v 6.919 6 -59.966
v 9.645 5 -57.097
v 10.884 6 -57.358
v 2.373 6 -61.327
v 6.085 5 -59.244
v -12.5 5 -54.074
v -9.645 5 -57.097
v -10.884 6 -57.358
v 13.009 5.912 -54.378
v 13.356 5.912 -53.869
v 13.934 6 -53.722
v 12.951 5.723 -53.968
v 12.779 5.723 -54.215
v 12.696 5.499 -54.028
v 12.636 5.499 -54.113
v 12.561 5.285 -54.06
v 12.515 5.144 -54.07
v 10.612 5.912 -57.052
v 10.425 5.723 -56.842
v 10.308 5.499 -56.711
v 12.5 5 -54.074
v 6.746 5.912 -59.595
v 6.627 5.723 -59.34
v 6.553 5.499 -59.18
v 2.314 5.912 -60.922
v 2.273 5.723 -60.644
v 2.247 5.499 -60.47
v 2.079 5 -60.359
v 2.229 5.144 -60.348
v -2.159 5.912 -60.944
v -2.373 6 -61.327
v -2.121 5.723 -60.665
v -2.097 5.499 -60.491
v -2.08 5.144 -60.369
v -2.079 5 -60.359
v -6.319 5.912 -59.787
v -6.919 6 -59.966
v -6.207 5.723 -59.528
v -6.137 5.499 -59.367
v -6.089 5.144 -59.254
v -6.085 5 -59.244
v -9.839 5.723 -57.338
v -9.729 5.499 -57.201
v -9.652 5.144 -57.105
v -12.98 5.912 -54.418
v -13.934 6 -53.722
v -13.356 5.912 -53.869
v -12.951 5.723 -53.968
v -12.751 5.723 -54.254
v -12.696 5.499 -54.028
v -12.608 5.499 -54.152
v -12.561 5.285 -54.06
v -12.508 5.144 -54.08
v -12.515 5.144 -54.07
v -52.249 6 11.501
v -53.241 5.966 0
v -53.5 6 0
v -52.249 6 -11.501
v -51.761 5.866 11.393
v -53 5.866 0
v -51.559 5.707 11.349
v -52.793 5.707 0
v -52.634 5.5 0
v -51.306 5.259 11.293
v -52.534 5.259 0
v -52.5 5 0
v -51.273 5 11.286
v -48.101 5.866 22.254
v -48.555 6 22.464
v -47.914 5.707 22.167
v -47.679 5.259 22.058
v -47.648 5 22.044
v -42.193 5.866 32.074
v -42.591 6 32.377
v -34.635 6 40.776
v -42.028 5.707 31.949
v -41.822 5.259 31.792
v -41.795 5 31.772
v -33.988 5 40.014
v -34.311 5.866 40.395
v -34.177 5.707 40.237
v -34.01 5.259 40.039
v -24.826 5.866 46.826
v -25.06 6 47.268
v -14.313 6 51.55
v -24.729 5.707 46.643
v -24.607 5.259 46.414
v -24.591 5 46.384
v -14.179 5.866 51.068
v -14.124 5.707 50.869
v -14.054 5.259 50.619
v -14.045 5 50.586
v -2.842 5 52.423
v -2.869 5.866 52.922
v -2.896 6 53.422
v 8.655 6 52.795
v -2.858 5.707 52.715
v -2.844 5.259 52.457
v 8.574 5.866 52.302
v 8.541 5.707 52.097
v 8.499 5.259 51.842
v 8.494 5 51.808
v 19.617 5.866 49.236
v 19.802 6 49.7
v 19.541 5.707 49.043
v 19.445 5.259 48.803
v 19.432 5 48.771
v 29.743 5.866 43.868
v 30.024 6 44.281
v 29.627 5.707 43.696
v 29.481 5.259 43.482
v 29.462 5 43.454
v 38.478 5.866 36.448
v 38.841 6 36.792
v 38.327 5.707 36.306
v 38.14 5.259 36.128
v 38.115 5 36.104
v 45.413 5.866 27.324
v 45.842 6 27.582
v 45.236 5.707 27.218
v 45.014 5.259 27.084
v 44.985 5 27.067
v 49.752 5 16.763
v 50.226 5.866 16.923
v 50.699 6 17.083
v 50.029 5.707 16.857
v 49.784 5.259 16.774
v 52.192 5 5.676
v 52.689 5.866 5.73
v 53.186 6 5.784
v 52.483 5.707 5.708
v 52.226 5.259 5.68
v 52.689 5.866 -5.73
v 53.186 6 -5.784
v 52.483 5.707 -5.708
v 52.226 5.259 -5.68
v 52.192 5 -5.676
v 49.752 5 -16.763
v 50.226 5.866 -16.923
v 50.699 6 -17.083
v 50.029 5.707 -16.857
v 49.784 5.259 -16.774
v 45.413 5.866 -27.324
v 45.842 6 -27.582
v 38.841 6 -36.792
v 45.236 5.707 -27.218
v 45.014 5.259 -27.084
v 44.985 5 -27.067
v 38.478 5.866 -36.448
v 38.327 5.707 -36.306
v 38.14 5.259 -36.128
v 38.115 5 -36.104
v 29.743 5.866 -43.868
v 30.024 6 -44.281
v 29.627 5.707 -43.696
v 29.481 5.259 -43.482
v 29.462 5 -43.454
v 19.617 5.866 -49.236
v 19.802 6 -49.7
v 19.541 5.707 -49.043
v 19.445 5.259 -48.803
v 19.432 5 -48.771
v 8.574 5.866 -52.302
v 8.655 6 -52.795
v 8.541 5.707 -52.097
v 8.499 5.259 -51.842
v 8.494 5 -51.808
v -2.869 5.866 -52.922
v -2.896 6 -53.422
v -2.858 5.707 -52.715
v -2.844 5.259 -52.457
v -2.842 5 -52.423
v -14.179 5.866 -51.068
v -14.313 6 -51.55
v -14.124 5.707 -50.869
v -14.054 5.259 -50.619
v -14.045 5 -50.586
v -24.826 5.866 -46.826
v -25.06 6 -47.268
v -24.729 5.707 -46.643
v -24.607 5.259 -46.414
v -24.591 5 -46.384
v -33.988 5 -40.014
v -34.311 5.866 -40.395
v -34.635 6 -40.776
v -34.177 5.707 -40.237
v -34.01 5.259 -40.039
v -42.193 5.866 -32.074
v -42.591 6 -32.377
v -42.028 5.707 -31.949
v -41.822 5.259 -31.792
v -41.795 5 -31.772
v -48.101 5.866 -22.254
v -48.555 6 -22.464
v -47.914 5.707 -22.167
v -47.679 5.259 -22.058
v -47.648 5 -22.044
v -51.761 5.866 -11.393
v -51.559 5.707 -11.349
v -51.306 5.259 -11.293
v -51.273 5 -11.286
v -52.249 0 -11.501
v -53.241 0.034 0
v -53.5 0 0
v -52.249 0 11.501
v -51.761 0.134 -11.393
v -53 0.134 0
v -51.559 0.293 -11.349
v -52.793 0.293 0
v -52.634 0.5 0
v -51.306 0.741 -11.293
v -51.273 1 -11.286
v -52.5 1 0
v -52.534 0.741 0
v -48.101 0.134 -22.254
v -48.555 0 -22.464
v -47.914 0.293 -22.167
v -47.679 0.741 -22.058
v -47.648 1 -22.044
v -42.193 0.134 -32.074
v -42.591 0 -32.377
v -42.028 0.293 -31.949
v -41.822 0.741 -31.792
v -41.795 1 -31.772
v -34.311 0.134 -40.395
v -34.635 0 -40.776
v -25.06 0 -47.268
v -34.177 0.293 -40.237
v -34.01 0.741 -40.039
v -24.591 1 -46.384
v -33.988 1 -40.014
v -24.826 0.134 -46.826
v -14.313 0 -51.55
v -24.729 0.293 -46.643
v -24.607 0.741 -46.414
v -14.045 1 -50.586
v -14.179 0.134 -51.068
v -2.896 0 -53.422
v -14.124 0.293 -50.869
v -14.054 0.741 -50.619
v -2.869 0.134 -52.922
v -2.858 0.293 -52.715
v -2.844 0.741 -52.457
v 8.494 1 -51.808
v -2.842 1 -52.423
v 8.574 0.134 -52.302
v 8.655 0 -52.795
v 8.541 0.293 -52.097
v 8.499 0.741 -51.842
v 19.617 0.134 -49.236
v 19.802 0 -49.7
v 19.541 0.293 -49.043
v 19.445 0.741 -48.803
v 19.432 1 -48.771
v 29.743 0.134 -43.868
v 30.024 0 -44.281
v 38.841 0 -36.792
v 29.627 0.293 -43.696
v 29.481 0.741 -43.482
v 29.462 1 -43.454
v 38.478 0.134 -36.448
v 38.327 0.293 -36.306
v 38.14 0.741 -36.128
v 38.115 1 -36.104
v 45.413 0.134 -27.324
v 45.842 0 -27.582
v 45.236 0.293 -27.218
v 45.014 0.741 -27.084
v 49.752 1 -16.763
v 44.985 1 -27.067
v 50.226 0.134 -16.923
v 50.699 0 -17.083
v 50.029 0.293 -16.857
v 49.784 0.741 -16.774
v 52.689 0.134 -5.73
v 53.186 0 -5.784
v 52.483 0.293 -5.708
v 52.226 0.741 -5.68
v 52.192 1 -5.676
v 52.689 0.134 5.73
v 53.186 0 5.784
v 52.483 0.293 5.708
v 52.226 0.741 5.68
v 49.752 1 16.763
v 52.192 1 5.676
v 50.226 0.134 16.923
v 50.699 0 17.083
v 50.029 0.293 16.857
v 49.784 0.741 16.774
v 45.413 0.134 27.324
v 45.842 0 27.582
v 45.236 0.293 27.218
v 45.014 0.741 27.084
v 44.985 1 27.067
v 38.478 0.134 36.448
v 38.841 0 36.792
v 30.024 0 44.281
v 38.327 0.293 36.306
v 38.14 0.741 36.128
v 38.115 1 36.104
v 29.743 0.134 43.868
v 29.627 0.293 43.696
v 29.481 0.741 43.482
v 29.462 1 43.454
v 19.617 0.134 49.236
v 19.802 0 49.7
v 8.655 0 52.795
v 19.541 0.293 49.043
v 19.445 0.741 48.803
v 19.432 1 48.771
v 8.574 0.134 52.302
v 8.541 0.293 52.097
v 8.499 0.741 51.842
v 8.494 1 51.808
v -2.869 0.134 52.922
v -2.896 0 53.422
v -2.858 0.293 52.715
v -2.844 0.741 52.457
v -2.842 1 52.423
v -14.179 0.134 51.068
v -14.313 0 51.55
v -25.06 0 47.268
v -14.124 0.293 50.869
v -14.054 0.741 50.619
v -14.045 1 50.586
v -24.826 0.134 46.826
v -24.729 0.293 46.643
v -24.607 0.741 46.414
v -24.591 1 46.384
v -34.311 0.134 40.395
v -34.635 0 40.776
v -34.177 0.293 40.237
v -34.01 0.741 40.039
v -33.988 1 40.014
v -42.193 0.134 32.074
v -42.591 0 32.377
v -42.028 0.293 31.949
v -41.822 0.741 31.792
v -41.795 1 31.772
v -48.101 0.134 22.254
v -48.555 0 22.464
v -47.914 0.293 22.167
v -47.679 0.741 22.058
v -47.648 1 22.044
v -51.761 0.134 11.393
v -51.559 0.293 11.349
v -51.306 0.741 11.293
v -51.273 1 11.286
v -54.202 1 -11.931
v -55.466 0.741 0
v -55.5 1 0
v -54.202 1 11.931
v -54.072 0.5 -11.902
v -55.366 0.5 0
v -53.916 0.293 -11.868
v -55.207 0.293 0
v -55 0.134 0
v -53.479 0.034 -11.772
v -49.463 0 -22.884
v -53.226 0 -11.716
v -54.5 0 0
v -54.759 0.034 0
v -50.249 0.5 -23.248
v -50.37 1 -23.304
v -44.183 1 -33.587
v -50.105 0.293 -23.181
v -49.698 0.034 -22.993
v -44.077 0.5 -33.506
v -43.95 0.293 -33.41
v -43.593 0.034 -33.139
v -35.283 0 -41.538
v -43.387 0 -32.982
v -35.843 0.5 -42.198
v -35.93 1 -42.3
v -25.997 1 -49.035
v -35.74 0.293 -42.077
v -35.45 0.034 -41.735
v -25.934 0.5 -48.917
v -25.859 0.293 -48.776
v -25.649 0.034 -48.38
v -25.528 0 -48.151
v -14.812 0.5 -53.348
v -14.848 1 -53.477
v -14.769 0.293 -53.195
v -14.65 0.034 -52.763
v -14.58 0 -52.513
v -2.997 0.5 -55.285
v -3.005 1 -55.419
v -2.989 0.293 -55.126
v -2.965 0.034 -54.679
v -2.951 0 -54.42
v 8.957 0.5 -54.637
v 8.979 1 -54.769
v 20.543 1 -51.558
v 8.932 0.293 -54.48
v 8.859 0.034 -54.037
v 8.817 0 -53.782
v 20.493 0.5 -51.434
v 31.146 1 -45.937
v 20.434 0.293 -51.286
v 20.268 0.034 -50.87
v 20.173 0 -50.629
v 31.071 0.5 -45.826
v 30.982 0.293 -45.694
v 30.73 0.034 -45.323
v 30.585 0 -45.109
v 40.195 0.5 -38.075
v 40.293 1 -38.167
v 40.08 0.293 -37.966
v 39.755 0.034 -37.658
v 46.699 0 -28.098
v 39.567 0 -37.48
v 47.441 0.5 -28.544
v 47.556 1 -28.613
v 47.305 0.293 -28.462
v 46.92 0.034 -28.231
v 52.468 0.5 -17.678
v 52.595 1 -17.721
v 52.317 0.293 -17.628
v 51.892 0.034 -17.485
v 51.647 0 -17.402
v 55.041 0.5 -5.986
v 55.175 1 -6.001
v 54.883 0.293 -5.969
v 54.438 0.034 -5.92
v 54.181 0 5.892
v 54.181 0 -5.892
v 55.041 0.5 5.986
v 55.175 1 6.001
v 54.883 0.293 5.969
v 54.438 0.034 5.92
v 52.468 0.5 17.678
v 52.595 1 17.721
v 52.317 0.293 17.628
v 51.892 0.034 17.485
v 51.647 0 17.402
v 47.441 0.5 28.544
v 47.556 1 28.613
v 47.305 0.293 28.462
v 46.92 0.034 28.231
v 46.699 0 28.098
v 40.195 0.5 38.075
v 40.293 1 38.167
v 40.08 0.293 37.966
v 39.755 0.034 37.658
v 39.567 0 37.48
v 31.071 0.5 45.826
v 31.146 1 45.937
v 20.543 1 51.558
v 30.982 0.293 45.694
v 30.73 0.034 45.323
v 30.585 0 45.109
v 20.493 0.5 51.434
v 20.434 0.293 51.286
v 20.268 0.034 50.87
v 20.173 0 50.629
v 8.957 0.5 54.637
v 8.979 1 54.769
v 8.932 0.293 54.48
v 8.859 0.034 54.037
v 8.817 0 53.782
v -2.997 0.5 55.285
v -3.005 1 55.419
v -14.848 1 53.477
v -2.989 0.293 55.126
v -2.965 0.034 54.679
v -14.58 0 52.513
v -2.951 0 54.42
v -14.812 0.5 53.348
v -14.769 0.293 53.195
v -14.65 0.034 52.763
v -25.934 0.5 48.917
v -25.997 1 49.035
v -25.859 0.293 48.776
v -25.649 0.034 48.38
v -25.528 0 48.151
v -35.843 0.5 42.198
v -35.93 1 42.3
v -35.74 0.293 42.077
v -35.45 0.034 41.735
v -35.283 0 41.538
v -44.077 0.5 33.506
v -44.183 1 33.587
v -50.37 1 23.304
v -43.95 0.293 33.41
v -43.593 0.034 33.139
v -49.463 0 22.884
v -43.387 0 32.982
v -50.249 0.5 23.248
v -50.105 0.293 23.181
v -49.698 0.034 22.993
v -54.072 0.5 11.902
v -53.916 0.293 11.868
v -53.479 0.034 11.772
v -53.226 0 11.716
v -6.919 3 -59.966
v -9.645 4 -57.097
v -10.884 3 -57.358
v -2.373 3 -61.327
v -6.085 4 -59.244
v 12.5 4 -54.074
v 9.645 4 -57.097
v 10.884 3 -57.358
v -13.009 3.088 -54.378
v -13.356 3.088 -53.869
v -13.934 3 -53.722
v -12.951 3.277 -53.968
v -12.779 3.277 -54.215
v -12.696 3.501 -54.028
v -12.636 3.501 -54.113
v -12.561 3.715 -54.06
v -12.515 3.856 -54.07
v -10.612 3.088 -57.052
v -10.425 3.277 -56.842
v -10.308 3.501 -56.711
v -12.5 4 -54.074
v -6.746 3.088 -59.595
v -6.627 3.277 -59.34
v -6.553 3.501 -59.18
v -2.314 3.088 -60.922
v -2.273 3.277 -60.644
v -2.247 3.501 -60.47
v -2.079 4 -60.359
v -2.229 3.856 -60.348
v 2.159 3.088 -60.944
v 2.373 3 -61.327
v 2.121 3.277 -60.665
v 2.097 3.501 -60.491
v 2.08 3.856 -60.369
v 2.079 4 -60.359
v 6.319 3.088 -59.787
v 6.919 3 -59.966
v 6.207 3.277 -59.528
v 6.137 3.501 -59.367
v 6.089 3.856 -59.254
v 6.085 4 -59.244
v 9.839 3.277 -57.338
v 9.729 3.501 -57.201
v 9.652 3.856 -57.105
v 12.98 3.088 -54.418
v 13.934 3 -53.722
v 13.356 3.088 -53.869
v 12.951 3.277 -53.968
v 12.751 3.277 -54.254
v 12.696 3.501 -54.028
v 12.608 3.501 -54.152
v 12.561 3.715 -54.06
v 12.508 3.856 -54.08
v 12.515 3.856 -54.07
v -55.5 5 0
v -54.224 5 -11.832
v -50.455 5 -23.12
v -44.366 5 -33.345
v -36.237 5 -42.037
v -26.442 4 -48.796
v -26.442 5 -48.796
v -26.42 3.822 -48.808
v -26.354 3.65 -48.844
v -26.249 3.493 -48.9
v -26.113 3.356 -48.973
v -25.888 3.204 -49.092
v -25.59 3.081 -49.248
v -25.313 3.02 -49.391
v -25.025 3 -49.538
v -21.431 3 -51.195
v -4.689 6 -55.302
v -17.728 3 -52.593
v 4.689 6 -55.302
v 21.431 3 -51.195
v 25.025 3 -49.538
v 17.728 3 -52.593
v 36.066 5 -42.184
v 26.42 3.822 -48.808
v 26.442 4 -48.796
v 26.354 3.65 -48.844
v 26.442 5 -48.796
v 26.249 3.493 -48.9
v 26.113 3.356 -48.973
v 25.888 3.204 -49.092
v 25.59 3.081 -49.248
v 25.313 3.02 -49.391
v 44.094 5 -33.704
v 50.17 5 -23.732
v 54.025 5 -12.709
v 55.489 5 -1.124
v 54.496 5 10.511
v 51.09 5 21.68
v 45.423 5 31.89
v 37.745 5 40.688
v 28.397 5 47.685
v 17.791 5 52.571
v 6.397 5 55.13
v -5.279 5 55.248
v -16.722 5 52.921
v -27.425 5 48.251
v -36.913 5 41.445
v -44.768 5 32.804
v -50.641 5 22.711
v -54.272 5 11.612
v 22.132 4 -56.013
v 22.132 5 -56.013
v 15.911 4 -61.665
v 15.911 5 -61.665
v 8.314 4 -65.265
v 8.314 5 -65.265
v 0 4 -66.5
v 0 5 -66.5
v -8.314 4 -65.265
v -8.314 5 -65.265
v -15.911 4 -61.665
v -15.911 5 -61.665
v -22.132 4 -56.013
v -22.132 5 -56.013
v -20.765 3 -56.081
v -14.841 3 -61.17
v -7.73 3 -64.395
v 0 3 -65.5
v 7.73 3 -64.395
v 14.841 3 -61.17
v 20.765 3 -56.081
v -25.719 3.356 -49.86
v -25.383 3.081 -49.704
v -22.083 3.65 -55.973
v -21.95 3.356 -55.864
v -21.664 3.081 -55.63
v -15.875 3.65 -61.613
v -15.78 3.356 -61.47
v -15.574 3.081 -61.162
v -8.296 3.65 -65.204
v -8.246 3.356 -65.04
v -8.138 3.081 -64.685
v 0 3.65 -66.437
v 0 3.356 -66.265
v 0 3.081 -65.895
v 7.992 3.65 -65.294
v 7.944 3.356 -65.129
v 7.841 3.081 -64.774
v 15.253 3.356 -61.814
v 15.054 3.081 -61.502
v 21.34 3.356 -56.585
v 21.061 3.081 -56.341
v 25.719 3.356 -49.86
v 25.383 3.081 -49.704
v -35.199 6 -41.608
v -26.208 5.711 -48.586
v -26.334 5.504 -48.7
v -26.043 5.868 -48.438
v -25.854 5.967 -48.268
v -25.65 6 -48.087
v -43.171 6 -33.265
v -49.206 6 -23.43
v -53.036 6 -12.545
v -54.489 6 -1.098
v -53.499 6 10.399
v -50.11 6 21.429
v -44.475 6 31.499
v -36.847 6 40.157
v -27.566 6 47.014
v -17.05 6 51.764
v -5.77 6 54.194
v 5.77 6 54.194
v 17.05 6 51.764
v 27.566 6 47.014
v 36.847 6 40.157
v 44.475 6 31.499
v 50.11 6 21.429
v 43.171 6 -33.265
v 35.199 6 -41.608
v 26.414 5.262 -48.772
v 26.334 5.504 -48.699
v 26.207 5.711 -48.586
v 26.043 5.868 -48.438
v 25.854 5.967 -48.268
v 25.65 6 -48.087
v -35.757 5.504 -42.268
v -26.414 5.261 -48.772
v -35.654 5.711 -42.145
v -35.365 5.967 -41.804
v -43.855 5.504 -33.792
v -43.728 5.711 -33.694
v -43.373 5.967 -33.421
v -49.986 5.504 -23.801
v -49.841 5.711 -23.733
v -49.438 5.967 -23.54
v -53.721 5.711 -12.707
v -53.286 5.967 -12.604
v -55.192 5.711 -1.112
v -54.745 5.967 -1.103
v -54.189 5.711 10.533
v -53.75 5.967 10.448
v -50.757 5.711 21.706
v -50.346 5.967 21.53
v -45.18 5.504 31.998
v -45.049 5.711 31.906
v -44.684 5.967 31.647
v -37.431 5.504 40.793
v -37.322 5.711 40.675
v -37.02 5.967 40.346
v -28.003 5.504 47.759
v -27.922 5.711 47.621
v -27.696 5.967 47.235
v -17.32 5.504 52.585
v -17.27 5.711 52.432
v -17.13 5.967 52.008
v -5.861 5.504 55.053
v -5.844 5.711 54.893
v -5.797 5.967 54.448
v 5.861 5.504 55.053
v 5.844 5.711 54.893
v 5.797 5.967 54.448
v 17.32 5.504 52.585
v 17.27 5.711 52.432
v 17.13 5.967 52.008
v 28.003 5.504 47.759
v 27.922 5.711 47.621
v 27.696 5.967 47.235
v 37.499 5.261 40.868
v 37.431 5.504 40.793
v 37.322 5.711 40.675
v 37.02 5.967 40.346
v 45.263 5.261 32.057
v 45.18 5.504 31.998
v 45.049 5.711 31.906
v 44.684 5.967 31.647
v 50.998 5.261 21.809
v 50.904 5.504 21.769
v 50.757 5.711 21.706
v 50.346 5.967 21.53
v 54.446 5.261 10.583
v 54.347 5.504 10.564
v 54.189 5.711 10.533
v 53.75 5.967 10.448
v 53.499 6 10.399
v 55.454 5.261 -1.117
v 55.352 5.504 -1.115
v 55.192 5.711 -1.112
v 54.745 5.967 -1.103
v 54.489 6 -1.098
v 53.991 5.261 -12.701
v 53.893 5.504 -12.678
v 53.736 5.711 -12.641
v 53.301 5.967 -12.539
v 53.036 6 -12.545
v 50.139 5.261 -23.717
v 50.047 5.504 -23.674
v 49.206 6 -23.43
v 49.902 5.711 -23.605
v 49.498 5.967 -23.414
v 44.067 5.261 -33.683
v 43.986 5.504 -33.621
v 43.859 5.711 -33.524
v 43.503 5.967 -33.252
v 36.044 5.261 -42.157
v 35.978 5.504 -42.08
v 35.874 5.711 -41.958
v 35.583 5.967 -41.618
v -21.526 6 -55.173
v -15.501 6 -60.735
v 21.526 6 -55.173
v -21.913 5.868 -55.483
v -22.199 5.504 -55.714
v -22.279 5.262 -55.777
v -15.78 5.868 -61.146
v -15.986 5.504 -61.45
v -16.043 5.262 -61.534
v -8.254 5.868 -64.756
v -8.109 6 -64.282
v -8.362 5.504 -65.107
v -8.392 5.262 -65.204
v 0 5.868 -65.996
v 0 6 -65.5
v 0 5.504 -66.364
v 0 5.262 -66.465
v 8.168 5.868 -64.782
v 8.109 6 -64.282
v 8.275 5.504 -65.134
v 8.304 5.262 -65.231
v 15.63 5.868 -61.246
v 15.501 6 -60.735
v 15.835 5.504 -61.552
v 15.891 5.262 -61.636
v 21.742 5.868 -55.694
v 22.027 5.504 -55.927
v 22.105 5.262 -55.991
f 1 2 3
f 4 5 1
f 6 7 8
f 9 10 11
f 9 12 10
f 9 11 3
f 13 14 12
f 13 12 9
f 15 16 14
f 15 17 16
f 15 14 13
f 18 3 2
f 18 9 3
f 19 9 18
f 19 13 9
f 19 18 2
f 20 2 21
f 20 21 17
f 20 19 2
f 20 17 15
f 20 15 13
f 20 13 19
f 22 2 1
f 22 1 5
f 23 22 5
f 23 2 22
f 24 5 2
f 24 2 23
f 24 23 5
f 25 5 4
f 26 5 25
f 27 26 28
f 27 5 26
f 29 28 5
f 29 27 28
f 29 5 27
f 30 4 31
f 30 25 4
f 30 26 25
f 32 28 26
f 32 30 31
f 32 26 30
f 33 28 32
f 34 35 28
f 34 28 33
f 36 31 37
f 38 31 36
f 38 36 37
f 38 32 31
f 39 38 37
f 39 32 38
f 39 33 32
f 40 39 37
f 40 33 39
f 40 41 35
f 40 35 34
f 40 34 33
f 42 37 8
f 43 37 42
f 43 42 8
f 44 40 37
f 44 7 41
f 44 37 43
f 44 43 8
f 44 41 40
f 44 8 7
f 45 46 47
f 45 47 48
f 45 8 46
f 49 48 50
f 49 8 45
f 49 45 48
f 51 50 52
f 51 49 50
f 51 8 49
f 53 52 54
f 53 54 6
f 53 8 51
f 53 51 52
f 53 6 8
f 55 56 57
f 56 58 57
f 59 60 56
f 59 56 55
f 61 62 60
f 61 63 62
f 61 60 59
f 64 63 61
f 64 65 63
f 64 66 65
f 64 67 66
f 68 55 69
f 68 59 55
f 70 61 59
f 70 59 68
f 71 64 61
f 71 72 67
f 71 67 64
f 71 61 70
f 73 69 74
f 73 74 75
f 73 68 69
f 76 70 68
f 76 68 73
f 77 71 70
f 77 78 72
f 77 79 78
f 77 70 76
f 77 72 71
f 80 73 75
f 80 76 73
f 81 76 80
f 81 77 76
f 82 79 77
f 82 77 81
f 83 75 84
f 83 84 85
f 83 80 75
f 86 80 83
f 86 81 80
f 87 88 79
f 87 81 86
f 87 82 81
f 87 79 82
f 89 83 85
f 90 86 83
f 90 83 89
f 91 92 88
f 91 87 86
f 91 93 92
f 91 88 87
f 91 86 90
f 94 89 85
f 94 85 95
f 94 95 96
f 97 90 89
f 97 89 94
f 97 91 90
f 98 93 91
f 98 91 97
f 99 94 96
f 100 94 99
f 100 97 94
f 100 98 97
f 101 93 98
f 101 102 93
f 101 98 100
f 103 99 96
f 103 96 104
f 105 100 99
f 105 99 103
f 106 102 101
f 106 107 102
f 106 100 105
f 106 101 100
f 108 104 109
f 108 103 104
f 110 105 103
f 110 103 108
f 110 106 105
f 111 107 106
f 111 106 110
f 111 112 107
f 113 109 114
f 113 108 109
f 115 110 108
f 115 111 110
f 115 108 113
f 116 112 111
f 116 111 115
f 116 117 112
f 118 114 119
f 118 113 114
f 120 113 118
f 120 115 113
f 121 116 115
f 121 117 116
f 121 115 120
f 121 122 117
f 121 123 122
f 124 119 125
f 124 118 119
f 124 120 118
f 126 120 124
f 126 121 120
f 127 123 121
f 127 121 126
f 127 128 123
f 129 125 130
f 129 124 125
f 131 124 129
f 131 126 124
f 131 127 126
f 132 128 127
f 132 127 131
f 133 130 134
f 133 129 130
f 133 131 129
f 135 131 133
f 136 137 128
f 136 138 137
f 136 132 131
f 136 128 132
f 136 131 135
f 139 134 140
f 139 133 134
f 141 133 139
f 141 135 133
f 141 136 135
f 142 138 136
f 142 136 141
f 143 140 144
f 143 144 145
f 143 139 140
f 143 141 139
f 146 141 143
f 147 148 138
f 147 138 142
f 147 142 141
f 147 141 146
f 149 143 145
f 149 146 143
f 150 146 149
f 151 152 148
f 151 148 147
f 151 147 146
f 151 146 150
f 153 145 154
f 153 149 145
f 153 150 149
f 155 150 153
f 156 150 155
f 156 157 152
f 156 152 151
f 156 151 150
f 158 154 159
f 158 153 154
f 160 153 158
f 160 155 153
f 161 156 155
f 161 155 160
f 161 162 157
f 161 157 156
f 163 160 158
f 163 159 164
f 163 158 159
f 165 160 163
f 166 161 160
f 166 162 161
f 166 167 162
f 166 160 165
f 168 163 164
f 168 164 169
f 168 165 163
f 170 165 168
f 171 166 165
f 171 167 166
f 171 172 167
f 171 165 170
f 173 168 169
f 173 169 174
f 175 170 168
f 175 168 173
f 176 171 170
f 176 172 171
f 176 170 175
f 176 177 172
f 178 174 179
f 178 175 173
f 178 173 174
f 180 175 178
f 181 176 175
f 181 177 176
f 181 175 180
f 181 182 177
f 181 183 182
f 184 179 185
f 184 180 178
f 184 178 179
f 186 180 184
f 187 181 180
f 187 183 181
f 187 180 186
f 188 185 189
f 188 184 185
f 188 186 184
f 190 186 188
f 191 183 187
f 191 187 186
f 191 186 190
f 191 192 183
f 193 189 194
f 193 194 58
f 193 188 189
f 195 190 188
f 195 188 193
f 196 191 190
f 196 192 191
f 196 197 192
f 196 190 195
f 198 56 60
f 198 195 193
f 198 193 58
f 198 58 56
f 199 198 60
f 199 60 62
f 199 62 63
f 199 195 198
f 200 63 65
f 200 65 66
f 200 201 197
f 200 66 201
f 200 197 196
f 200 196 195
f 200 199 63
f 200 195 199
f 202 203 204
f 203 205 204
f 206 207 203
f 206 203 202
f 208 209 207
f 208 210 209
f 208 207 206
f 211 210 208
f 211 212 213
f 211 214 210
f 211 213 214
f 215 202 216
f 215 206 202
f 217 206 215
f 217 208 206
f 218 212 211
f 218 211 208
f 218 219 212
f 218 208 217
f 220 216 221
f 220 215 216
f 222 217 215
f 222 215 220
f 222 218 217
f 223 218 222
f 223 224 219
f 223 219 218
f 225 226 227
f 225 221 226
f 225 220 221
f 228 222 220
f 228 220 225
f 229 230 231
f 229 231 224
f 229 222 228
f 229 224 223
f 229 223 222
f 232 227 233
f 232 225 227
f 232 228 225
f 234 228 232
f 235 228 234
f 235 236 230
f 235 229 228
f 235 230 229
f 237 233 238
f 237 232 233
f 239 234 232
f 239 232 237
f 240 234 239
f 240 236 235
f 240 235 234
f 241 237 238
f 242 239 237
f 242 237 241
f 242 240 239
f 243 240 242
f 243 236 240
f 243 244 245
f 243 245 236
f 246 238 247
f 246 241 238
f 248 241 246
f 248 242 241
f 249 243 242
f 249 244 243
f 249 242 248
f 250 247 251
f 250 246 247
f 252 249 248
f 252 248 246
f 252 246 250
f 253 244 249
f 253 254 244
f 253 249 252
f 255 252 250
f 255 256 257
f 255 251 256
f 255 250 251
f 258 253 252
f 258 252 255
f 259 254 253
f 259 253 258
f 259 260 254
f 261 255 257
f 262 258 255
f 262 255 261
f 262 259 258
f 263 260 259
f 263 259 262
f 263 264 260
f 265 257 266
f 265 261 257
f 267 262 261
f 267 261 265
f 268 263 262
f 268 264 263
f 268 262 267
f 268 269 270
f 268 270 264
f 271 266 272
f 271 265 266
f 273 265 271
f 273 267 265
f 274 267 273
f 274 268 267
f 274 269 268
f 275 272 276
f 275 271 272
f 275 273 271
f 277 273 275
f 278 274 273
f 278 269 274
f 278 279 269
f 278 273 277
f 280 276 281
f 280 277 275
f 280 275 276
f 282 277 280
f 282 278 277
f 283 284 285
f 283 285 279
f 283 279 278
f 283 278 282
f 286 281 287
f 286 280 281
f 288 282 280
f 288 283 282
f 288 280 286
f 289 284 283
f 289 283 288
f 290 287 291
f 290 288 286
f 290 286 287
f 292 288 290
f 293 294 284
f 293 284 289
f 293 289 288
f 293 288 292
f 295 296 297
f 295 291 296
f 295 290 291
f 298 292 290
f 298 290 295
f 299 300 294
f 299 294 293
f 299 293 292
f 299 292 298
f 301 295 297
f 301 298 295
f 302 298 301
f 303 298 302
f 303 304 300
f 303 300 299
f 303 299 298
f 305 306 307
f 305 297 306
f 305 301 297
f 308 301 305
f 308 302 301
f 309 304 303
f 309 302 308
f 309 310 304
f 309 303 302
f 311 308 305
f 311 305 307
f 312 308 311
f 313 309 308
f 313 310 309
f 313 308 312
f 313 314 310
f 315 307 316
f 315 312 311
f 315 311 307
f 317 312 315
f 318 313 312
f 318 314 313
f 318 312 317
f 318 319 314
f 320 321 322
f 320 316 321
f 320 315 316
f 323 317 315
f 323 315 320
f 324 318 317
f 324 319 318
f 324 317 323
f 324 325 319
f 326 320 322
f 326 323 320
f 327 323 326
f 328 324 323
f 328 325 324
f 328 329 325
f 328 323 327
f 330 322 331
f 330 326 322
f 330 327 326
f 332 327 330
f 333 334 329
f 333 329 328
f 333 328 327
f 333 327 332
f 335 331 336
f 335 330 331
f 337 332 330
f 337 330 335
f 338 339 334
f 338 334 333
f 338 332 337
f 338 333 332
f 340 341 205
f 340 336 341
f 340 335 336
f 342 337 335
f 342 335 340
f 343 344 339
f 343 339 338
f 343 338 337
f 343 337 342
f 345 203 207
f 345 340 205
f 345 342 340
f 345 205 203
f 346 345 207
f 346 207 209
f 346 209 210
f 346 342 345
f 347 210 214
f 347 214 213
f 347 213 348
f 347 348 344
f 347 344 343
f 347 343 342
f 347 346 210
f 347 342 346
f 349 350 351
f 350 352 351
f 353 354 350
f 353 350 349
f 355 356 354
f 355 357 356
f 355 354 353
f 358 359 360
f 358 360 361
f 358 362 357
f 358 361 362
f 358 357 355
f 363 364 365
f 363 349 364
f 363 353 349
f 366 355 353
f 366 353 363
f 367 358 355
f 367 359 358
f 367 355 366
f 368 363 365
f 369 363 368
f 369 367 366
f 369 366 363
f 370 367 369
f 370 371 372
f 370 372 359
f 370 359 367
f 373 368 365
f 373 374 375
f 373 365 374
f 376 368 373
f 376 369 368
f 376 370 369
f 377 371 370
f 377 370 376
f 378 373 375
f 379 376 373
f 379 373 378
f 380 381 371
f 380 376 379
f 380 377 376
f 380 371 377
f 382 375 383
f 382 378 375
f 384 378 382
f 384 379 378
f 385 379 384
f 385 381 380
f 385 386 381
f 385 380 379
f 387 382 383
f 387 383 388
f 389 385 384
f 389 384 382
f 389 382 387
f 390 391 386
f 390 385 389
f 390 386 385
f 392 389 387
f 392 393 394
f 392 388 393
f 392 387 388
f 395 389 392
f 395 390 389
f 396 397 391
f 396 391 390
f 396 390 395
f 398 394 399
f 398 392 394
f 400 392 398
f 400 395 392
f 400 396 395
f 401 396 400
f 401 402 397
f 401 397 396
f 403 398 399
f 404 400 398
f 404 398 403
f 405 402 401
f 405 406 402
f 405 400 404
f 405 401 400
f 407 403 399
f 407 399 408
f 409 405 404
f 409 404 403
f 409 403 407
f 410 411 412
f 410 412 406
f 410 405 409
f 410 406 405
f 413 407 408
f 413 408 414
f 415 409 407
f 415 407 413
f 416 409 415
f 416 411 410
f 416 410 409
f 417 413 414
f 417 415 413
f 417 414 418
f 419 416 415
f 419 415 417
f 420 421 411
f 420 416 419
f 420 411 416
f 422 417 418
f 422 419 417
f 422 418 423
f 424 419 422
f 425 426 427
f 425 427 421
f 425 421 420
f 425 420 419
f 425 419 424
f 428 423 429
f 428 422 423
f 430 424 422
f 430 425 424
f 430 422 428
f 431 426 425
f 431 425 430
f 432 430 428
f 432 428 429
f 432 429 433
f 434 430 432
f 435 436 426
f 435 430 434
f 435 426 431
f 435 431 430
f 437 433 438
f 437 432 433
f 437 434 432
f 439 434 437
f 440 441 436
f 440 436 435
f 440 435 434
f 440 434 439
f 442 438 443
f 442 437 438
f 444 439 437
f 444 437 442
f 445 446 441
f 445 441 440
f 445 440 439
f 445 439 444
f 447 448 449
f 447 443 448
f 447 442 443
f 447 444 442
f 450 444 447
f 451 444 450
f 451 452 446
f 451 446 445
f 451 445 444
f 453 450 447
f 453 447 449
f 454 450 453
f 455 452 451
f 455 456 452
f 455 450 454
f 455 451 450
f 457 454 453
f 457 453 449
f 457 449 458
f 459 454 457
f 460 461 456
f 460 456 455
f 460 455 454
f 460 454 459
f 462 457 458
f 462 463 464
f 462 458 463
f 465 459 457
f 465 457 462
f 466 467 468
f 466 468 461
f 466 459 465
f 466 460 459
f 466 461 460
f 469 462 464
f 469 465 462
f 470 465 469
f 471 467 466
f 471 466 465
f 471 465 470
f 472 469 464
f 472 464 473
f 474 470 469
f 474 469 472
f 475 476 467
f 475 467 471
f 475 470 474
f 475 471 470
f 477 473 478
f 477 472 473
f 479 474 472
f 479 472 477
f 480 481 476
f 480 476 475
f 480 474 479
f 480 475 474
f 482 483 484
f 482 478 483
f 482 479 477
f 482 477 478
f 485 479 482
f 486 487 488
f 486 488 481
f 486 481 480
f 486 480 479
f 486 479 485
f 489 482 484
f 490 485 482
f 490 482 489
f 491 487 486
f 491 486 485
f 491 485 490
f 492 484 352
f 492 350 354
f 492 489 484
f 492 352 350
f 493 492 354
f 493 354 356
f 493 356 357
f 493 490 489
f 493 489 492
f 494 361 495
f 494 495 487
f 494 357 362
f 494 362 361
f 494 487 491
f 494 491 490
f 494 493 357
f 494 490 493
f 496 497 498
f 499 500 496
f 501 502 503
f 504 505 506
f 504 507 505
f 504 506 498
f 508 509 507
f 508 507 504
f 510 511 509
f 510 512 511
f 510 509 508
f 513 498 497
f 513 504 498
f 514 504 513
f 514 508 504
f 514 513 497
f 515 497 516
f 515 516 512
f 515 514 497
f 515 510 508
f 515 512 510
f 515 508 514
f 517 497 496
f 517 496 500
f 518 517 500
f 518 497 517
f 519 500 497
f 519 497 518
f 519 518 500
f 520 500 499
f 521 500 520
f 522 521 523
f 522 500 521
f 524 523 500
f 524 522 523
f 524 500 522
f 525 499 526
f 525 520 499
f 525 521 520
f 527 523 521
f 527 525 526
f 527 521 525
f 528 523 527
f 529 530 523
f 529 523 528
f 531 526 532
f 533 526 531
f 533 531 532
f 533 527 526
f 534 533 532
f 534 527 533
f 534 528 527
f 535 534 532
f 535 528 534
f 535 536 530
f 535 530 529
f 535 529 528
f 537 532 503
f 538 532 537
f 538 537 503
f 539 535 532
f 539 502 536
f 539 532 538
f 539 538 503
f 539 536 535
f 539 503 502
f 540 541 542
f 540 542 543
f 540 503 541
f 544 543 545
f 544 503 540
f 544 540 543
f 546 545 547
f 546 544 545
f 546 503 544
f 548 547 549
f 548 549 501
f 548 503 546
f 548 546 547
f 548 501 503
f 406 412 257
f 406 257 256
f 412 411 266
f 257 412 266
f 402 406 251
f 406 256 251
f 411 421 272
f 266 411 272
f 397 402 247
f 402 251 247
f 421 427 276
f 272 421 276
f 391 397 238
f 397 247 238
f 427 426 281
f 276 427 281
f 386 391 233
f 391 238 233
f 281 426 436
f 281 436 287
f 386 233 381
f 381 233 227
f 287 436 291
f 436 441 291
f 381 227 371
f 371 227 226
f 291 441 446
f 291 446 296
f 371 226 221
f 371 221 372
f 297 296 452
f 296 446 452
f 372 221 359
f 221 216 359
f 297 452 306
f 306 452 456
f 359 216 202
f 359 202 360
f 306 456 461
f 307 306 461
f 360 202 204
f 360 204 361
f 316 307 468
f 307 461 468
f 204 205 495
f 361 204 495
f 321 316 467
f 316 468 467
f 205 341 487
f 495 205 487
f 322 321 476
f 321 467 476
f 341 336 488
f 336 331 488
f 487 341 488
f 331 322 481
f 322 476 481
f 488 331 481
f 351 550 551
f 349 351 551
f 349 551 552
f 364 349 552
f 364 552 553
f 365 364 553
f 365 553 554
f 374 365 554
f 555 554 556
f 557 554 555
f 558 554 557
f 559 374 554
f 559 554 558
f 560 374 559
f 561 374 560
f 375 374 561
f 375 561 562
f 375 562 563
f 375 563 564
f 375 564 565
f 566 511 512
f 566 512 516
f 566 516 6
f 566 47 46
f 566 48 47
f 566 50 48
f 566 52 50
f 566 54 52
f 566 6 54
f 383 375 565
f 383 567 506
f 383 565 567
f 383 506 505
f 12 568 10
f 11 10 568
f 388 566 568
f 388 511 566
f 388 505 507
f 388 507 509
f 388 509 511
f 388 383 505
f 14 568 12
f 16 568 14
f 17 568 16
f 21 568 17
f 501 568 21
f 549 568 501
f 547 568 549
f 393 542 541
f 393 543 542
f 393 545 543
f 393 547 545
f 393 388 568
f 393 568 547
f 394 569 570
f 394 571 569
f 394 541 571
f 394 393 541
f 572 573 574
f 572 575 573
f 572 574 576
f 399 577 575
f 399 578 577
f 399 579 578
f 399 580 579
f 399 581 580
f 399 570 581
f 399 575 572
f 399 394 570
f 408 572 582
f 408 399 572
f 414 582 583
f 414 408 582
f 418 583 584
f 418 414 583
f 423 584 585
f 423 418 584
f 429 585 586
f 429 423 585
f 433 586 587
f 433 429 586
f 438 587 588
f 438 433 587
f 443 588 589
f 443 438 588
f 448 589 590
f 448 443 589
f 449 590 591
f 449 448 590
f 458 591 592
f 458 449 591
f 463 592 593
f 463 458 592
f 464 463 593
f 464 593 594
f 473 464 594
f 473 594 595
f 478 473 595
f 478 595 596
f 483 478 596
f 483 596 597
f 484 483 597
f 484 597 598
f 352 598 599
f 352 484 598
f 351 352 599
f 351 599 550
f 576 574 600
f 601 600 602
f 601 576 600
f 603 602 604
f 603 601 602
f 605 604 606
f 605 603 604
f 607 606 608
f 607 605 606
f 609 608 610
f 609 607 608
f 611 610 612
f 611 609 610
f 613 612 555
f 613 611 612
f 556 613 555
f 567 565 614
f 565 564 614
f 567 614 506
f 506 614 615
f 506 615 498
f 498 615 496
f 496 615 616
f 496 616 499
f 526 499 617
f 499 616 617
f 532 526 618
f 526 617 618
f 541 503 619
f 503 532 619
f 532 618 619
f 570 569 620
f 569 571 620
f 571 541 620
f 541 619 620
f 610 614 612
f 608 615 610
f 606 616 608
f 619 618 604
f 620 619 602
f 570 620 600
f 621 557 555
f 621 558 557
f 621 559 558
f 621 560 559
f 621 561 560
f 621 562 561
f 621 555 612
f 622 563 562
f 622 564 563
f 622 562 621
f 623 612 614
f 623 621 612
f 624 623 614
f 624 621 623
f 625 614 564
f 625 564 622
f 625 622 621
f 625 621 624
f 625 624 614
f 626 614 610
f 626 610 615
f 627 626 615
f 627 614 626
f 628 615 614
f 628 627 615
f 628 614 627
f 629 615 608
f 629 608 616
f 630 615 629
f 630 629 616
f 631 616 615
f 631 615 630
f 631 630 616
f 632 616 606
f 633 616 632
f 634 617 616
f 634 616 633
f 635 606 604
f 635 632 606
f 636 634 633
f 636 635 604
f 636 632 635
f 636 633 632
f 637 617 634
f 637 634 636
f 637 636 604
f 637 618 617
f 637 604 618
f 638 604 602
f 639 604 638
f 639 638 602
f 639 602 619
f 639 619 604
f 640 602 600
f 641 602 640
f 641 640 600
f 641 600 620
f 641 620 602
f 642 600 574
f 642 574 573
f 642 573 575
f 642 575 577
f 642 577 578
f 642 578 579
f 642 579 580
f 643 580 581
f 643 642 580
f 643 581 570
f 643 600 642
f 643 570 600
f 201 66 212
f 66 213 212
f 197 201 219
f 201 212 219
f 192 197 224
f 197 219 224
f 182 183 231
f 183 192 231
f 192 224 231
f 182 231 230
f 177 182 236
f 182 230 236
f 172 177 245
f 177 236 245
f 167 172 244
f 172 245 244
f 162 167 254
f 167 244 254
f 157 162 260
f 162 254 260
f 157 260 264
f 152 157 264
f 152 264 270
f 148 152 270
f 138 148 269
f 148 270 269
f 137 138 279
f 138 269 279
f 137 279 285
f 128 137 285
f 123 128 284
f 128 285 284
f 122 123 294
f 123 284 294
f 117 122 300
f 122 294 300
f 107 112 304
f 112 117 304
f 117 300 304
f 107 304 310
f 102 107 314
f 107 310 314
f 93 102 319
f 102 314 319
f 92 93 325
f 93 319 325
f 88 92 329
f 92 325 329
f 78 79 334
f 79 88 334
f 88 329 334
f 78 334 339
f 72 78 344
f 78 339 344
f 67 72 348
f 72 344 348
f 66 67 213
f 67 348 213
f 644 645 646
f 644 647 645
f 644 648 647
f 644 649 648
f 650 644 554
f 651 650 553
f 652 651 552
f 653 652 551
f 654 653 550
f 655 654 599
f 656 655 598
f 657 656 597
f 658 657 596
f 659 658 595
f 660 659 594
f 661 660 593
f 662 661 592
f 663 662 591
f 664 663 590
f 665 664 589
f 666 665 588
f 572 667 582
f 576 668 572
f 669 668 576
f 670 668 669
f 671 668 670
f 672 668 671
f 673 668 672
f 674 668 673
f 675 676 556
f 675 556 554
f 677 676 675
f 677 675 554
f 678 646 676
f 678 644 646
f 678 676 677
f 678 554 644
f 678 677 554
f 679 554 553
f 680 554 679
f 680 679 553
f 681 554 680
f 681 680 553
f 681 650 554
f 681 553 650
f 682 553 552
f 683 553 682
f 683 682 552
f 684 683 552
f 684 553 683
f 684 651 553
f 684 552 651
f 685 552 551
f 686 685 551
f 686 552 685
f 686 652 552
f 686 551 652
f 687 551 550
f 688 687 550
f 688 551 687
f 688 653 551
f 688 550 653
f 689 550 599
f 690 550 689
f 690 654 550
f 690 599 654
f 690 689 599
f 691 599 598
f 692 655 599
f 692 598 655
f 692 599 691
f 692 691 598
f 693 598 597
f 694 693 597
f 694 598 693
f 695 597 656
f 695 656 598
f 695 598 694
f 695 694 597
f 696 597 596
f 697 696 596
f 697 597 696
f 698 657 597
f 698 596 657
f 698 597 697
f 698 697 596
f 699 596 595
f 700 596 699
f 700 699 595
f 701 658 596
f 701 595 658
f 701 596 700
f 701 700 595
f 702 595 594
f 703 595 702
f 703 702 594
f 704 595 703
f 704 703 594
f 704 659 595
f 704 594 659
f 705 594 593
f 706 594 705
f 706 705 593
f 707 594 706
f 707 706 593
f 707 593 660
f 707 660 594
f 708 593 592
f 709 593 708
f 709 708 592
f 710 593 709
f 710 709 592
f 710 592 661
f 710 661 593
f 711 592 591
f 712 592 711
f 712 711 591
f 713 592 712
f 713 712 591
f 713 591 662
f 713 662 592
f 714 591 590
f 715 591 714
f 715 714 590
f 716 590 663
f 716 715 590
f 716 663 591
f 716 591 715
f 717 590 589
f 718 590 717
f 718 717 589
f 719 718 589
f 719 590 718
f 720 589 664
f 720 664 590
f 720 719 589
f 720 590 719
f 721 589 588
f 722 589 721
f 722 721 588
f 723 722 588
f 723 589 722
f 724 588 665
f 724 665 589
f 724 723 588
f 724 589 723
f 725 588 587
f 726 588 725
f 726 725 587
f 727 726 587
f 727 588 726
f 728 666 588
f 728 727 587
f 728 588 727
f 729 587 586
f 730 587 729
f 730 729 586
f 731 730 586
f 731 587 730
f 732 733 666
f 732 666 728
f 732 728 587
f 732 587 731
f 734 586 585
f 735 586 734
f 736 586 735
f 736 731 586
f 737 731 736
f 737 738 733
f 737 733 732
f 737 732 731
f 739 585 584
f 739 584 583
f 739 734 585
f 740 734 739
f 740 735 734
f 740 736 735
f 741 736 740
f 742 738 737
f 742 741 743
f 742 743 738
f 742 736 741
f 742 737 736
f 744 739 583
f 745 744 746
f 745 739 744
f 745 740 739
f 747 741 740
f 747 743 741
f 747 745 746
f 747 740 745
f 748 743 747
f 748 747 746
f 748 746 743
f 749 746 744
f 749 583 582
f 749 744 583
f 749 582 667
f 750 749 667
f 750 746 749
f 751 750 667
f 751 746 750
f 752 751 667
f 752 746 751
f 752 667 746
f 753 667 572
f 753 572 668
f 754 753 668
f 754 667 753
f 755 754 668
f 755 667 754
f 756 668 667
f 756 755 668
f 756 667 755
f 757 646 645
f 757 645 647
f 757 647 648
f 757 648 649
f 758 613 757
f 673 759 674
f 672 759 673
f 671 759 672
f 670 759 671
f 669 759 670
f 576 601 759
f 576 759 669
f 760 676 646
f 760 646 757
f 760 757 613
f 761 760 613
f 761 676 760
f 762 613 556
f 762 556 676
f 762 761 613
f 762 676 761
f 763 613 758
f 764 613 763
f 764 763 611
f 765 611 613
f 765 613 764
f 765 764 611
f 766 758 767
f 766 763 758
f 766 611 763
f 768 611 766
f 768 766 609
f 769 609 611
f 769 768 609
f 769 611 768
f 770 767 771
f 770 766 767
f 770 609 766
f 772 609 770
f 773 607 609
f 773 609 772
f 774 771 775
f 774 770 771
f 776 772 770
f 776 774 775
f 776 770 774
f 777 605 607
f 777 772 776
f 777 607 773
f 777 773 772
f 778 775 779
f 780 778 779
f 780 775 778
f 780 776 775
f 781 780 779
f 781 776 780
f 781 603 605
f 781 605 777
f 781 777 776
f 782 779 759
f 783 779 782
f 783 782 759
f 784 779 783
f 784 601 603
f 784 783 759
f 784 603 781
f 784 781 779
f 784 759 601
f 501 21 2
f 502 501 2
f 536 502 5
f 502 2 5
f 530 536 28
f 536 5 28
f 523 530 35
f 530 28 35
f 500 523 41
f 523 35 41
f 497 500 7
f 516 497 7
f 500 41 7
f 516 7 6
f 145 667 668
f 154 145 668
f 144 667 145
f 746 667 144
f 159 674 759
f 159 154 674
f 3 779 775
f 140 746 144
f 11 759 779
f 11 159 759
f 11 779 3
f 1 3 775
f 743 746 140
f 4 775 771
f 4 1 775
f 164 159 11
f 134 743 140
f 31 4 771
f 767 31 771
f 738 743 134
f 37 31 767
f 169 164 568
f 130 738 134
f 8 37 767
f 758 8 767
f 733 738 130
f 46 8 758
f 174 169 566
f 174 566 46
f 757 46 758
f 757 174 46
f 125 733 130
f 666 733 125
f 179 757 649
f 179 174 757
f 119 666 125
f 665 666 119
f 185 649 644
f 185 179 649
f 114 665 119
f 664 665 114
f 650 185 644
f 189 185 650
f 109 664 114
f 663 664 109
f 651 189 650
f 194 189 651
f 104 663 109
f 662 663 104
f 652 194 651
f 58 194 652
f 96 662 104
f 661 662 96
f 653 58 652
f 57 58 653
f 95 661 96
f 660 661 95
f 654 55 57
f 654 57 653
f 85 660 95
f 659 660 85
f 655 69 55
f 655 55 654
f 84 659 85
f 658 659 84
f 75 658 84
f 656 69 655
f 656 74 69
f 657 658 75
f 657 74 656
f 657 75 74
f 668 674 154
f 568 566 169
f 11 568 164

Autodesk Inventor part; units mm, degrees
ref_plane "YZ Plane" through (0, 0, 0) normal (1, 0, 0) x (0, 1, 0)
ref_plane "XZ Plane" through (0, 0, 0) normal (0, 1, 0) x (-1, 0, 0)
ref_plane "XY Plane" through (0, 0, 0) normal (0, 0, 1) x (1, 0, 0)
sketch "Sketch1" plane through (0, 0, 0) normal (0, 1, 0) x (-1, 0, 0)
  circle A0 centre (0, 0) radius 52.5
  circle A1 centre (0, 0) radius 55.5
  dimension "d0" = 105
  dimension "d1" = 3
extrude "Extrusion1" add sketch "Sketch1" along normal blind 6
sketch "Sketch2" plane through (0, 6, 0) normal (0, 1, 0) x (1, 0, 0)
  circle A0 centre (0, 0) radius 52.5
  circle A1 centre (0, 0) radius 55.5
  circle A2 centre (0, 0) radius 55.5 construction
  arc A3 (12.5, 54.074023) -> (-12.5, 54.074023) centre (0, 45.129327) ccw
  arc A4 (26.441888, 48.796276) -> (-26.441888, 48.796276) centre (0, 37.901631) ccw
  dimension "d4" = 6
  dimension "d5" = 25
  dimension "d6" = 5
  dimension "d7" = 52.88378
extrude "Extrusion2" add sketch "Sketch2" against normal blind 3 contours A1 A3 A4
fillet "Fillet1" radius 1 9 edges at (-47.6853, 6, -28.3965) (28.3965, 6, 47.6853) (52.5, 6, 0) (55.5, 0, 0) (52.5, 0, 0) (0, 6, -66.5) (0, 6, -60.5) (0, 3, -60.5) (0, 3, -66.5)
properties part number "BladderHook"
